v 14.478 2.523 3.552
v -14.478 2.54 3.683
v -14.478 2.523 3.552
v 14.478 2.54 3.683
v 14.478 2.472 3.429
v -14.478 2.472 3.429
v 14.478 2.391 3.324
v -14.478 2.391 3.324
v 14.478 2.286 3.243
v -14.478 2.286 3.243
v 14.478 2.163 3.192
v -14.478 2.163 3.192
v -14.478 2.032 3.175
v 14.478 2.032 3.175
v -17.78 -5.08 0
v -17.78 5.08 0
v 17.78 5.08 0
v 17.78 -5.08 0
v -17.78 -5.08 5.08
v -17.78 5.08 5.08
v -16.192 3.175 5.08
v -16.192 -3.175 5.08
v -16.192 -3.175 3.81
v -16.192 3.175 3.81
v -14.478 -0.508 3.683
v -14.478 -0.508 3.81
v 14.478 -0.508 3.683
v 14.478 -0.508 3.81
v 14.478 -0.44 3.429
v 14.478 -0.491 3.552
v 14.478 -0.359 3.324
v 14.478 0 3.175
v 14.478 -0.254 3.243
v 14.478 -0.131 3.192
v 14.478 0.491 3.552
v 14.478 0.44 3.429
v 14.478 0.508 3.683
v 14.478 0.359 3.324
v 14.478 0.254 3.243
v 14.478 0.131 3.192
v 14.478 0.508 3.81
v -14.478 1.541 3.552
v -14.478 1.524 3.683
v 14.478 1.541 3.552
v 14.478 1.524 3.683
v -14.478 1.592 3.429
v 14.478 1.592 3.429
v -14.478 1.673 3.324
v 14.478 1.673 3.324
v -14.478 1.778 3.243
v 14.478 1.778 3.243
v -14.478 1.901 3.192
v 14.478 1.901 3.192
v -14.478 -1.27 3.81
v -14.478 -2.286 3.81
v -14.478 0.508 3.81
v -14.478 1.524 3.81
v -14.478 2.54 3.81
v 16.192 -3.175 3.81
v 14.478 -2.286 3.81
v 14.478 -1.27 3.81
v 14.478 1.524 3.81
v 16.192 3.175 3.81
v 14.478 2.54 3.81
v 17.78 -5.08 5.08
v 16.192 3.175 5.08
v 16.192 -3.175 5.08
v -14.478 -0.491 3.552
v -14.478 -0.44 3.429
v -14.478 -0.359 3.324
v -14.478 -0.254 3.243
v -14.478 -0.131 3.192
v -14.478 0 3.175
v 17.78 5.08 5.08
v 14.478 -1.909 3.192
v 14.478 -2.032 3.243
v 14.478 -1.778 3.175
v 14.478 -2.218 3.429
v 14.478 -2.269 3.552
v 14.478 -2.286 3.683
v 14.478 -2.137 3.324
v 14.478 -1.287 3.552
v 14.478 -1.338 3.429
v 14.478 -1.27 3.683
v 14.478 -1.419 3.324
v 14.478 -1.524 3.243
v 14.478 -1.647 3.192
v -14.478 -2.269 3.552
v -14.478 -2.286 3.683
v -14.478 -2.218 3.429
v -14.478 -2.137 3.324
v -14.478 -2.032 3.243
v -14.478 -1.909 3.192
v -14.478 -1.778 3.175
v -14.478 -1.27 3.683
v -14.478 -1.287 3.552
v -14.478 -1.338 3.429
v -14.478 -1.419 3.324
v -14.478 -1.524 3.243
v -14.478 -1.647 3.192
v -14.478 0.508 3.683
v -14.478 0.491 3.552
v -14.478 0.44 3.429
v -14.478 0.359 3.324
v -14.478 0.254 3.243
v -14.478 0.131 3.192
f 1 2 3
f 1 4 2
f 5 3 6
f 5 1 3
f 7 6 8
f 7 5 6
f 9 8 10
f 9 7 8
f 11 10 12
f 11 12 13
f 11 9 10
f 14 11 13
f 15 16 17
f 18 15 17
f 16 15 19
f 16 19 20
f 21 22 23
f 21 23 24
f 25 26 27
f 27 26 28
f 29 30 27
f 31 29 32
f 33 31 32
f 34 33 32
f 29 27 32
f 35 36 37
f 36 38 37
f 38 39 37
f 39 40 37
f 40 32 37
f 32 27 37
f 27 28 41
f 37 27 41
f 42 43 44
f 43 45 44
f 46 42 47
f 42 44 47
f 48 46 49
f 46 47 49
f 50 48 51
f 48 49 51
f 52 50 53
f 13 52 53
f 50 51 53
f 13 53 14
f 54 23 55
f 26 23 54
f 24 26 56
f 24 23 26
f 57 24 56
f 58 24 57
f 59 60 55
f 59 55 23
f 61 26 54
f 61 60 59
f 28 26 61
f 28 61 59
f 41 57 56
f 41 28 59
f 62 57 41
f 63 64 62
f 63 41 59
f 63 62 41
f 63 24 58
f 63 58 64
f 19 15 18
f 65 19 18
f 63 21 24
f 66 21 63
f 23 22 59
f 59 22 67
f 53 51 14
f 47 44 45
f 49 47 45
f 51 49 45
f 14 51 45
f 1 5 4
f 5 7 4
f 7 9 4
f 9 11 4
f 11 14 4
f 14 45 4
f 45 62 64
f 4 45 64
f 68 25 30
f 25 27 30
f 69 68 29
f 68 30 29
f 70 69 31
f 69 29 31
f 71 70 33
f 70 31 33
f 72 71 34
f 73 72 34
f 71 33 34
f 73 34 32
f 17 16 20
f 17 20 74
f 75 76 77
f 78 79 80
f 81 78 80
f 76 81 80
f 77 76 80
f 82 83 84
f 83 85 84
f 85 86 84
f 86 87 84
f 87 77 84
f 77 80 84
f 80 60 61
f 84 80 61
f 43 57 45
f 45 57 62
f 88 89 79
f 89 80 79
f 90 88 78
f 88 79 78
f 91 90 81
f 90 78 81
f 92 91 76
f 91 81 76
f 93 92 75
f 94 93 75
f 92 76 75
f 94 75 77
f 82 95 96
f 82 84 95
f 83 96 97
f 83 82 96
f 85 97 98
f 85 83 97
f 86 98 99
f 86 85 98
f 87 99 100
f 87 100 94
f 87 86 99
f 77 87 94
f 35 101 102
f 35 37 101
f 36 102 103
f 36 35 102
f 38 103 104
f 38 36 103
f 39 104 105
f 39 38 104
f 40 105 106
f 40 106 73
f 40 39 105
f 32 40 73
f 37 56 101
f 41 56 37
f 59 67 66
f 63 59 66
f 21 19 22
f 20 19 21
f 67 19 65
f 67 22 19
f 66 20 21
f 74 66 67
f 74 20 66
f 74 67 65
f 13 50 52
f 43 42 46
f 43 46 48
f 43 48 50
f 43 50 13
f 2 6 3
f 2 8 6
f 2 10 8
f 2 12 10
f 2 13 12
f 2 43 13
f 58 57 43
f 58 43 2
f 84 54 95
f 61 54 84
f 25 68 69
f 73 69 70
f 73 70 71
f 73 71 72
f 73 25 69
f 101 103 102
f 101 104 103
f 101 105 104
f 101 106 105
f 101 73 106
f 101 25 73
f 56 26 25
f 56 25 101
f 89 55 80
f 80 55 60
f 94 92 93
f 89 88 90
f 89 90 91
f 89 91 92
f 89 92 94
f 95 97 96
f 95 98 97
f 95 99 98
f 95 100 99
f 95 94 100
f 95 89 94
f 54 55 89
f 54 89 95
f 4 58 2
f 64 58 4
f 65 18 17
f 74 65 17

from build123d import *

# Parameters (mm, degrees)
F0_W     = 35.56
F0_H     = 10.16
F1_DEPTH = 5.08
F2_W     = 32.385
F2_H     = 6.35
F3_DEPTH = 1.27
F4_W     = 28.956
F4_H     = 1.016
F5_DEPTH = 0.635
F6_R     = 0.50799


# Not quite as in the source:
# - a fillet or chamfer is up to 0.001 mm smaller than in the source, because OpenCascade refuses the exact size


with BuildPart() as f1:
    # F0 (on Top) → F1 (new body)
    with BuildSketch(Plane.XY):
        Rectangle(F0_W, F0_H)
    extrude(amount=F1_DEPTH)

    # F2 (on face) → F3 (cut)
    with BuildSketch(Plane.XY.offset(5.08)):
        Rectangle(F2_W, F2_H)
    extrude(amount=-F3_DEPTH, mode=Mode.SUBTRACT)

    # F4 (on face) → F5 (cut)
    with BuildSketch(Plane.XY.offset(3.81)):
        Rectangle(F4_W, F4_H)
        with Locations((0, 2.032)):
            Rectangle(F4_W, F4_H)
        with Locations((0, -1.778)):
            Rectangle(F4_W, F4_H)
    extrude(amount=-F5_DEPTH, mode=Mode.SUBTRACT)

    # F6 (radius 0.508 in the source; OpenCascade refuses exactly that, so slightly less here)
    f6_edges = [f1.edges().sort_by_distance(p)[0] for p in [
        (0, 0.508, 3.175),
        (0, -0.508, 3.175),
        (0, 2.54, 3.175),
        (0, -1.27, 3.175),
        (0, 1.524, 3.175),
        (0, -2.286, 3.175),
    ]]
    fillet(f6_edges, radius=F6_R)


solid = f1.part
